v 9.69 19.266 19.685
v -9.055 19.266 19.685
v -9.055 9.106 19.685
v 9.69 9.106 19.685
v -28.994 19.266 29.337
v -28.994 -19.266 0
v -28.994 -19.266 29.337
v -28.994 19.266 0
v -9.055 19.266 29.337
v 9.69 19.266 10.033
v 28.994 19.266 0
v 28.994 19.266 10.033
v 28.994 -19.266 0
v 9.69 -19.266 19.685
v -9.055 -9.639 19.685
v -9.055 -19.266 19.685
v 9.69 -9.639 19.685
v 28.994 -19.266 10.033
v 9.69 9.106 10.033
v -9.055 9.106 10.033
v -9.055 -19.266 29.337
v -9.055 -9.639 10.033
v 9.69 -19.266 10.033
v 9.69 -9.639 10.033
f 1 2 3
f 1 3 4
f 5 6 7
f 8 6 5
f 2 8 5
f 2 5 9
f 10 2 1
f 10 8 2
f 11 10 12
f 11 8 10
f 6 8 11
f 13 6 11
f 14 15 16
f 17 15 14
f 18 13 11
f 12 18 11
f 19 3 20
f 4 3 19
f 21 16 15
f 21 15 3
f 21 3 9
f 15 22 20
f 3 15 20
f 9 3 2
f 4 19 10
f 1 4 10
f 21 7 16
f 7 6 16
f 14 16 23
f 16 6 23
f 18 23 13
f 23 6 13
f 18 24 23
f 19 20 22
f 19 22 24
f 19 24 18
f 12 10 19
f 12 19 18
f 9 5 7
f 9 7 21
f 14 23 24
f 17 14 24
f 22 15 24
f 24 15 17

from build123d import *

# Parameters (mm, degrees)
F0_W     = 57.9882
F0_H     = 38.5318
F1_DEPTH = 10.033
F2_W     = 38.6842
F2_H     = 38.5318
F3_DEPTH = 9.652
F4_W     = 18.7452
F4_H     = 18.7452
F5_DEPTH = 9.652
F6_W     = 19.939
F6_H     = 38.5318
F7_DEPTH = 9.652


with BuildPart() as f1:
    # F0 (on Top) → F1 (new body)
    with BuildSketch(Plane.XY):
        Rectangle(F0_W, F0_H)
    extrude(amount=F1_DEPTH)

    # F2 (on face) → F3 (join)
    with BuildSketch(Plane.XY.offset(10.033)):
        with Locations((-9.652, 0)):
            Rectangle(F2_W, F2_H)
    extrude(amount=F3_DEPTH)

    # F4 (on face) → F5 (cut)
    with BuildSketch(Plane.XY.offset(19.685)):
        with Locations((0.3175, -0.2667)):
            Rectangle(F4_W, F4_H)
    extrude(amount=-F5_DEPTH, mode=Mode.SUBTRACT)

    # F6 (on face) → F7 (join)
    with BuildSketch(Plane.XY.offset(19.685)):
        with Locations((-19.0246, 0)):
            Rectangle(F6_W, F6_H)
    extrude(amount=F7_DEPTH)


solid = f1.part
